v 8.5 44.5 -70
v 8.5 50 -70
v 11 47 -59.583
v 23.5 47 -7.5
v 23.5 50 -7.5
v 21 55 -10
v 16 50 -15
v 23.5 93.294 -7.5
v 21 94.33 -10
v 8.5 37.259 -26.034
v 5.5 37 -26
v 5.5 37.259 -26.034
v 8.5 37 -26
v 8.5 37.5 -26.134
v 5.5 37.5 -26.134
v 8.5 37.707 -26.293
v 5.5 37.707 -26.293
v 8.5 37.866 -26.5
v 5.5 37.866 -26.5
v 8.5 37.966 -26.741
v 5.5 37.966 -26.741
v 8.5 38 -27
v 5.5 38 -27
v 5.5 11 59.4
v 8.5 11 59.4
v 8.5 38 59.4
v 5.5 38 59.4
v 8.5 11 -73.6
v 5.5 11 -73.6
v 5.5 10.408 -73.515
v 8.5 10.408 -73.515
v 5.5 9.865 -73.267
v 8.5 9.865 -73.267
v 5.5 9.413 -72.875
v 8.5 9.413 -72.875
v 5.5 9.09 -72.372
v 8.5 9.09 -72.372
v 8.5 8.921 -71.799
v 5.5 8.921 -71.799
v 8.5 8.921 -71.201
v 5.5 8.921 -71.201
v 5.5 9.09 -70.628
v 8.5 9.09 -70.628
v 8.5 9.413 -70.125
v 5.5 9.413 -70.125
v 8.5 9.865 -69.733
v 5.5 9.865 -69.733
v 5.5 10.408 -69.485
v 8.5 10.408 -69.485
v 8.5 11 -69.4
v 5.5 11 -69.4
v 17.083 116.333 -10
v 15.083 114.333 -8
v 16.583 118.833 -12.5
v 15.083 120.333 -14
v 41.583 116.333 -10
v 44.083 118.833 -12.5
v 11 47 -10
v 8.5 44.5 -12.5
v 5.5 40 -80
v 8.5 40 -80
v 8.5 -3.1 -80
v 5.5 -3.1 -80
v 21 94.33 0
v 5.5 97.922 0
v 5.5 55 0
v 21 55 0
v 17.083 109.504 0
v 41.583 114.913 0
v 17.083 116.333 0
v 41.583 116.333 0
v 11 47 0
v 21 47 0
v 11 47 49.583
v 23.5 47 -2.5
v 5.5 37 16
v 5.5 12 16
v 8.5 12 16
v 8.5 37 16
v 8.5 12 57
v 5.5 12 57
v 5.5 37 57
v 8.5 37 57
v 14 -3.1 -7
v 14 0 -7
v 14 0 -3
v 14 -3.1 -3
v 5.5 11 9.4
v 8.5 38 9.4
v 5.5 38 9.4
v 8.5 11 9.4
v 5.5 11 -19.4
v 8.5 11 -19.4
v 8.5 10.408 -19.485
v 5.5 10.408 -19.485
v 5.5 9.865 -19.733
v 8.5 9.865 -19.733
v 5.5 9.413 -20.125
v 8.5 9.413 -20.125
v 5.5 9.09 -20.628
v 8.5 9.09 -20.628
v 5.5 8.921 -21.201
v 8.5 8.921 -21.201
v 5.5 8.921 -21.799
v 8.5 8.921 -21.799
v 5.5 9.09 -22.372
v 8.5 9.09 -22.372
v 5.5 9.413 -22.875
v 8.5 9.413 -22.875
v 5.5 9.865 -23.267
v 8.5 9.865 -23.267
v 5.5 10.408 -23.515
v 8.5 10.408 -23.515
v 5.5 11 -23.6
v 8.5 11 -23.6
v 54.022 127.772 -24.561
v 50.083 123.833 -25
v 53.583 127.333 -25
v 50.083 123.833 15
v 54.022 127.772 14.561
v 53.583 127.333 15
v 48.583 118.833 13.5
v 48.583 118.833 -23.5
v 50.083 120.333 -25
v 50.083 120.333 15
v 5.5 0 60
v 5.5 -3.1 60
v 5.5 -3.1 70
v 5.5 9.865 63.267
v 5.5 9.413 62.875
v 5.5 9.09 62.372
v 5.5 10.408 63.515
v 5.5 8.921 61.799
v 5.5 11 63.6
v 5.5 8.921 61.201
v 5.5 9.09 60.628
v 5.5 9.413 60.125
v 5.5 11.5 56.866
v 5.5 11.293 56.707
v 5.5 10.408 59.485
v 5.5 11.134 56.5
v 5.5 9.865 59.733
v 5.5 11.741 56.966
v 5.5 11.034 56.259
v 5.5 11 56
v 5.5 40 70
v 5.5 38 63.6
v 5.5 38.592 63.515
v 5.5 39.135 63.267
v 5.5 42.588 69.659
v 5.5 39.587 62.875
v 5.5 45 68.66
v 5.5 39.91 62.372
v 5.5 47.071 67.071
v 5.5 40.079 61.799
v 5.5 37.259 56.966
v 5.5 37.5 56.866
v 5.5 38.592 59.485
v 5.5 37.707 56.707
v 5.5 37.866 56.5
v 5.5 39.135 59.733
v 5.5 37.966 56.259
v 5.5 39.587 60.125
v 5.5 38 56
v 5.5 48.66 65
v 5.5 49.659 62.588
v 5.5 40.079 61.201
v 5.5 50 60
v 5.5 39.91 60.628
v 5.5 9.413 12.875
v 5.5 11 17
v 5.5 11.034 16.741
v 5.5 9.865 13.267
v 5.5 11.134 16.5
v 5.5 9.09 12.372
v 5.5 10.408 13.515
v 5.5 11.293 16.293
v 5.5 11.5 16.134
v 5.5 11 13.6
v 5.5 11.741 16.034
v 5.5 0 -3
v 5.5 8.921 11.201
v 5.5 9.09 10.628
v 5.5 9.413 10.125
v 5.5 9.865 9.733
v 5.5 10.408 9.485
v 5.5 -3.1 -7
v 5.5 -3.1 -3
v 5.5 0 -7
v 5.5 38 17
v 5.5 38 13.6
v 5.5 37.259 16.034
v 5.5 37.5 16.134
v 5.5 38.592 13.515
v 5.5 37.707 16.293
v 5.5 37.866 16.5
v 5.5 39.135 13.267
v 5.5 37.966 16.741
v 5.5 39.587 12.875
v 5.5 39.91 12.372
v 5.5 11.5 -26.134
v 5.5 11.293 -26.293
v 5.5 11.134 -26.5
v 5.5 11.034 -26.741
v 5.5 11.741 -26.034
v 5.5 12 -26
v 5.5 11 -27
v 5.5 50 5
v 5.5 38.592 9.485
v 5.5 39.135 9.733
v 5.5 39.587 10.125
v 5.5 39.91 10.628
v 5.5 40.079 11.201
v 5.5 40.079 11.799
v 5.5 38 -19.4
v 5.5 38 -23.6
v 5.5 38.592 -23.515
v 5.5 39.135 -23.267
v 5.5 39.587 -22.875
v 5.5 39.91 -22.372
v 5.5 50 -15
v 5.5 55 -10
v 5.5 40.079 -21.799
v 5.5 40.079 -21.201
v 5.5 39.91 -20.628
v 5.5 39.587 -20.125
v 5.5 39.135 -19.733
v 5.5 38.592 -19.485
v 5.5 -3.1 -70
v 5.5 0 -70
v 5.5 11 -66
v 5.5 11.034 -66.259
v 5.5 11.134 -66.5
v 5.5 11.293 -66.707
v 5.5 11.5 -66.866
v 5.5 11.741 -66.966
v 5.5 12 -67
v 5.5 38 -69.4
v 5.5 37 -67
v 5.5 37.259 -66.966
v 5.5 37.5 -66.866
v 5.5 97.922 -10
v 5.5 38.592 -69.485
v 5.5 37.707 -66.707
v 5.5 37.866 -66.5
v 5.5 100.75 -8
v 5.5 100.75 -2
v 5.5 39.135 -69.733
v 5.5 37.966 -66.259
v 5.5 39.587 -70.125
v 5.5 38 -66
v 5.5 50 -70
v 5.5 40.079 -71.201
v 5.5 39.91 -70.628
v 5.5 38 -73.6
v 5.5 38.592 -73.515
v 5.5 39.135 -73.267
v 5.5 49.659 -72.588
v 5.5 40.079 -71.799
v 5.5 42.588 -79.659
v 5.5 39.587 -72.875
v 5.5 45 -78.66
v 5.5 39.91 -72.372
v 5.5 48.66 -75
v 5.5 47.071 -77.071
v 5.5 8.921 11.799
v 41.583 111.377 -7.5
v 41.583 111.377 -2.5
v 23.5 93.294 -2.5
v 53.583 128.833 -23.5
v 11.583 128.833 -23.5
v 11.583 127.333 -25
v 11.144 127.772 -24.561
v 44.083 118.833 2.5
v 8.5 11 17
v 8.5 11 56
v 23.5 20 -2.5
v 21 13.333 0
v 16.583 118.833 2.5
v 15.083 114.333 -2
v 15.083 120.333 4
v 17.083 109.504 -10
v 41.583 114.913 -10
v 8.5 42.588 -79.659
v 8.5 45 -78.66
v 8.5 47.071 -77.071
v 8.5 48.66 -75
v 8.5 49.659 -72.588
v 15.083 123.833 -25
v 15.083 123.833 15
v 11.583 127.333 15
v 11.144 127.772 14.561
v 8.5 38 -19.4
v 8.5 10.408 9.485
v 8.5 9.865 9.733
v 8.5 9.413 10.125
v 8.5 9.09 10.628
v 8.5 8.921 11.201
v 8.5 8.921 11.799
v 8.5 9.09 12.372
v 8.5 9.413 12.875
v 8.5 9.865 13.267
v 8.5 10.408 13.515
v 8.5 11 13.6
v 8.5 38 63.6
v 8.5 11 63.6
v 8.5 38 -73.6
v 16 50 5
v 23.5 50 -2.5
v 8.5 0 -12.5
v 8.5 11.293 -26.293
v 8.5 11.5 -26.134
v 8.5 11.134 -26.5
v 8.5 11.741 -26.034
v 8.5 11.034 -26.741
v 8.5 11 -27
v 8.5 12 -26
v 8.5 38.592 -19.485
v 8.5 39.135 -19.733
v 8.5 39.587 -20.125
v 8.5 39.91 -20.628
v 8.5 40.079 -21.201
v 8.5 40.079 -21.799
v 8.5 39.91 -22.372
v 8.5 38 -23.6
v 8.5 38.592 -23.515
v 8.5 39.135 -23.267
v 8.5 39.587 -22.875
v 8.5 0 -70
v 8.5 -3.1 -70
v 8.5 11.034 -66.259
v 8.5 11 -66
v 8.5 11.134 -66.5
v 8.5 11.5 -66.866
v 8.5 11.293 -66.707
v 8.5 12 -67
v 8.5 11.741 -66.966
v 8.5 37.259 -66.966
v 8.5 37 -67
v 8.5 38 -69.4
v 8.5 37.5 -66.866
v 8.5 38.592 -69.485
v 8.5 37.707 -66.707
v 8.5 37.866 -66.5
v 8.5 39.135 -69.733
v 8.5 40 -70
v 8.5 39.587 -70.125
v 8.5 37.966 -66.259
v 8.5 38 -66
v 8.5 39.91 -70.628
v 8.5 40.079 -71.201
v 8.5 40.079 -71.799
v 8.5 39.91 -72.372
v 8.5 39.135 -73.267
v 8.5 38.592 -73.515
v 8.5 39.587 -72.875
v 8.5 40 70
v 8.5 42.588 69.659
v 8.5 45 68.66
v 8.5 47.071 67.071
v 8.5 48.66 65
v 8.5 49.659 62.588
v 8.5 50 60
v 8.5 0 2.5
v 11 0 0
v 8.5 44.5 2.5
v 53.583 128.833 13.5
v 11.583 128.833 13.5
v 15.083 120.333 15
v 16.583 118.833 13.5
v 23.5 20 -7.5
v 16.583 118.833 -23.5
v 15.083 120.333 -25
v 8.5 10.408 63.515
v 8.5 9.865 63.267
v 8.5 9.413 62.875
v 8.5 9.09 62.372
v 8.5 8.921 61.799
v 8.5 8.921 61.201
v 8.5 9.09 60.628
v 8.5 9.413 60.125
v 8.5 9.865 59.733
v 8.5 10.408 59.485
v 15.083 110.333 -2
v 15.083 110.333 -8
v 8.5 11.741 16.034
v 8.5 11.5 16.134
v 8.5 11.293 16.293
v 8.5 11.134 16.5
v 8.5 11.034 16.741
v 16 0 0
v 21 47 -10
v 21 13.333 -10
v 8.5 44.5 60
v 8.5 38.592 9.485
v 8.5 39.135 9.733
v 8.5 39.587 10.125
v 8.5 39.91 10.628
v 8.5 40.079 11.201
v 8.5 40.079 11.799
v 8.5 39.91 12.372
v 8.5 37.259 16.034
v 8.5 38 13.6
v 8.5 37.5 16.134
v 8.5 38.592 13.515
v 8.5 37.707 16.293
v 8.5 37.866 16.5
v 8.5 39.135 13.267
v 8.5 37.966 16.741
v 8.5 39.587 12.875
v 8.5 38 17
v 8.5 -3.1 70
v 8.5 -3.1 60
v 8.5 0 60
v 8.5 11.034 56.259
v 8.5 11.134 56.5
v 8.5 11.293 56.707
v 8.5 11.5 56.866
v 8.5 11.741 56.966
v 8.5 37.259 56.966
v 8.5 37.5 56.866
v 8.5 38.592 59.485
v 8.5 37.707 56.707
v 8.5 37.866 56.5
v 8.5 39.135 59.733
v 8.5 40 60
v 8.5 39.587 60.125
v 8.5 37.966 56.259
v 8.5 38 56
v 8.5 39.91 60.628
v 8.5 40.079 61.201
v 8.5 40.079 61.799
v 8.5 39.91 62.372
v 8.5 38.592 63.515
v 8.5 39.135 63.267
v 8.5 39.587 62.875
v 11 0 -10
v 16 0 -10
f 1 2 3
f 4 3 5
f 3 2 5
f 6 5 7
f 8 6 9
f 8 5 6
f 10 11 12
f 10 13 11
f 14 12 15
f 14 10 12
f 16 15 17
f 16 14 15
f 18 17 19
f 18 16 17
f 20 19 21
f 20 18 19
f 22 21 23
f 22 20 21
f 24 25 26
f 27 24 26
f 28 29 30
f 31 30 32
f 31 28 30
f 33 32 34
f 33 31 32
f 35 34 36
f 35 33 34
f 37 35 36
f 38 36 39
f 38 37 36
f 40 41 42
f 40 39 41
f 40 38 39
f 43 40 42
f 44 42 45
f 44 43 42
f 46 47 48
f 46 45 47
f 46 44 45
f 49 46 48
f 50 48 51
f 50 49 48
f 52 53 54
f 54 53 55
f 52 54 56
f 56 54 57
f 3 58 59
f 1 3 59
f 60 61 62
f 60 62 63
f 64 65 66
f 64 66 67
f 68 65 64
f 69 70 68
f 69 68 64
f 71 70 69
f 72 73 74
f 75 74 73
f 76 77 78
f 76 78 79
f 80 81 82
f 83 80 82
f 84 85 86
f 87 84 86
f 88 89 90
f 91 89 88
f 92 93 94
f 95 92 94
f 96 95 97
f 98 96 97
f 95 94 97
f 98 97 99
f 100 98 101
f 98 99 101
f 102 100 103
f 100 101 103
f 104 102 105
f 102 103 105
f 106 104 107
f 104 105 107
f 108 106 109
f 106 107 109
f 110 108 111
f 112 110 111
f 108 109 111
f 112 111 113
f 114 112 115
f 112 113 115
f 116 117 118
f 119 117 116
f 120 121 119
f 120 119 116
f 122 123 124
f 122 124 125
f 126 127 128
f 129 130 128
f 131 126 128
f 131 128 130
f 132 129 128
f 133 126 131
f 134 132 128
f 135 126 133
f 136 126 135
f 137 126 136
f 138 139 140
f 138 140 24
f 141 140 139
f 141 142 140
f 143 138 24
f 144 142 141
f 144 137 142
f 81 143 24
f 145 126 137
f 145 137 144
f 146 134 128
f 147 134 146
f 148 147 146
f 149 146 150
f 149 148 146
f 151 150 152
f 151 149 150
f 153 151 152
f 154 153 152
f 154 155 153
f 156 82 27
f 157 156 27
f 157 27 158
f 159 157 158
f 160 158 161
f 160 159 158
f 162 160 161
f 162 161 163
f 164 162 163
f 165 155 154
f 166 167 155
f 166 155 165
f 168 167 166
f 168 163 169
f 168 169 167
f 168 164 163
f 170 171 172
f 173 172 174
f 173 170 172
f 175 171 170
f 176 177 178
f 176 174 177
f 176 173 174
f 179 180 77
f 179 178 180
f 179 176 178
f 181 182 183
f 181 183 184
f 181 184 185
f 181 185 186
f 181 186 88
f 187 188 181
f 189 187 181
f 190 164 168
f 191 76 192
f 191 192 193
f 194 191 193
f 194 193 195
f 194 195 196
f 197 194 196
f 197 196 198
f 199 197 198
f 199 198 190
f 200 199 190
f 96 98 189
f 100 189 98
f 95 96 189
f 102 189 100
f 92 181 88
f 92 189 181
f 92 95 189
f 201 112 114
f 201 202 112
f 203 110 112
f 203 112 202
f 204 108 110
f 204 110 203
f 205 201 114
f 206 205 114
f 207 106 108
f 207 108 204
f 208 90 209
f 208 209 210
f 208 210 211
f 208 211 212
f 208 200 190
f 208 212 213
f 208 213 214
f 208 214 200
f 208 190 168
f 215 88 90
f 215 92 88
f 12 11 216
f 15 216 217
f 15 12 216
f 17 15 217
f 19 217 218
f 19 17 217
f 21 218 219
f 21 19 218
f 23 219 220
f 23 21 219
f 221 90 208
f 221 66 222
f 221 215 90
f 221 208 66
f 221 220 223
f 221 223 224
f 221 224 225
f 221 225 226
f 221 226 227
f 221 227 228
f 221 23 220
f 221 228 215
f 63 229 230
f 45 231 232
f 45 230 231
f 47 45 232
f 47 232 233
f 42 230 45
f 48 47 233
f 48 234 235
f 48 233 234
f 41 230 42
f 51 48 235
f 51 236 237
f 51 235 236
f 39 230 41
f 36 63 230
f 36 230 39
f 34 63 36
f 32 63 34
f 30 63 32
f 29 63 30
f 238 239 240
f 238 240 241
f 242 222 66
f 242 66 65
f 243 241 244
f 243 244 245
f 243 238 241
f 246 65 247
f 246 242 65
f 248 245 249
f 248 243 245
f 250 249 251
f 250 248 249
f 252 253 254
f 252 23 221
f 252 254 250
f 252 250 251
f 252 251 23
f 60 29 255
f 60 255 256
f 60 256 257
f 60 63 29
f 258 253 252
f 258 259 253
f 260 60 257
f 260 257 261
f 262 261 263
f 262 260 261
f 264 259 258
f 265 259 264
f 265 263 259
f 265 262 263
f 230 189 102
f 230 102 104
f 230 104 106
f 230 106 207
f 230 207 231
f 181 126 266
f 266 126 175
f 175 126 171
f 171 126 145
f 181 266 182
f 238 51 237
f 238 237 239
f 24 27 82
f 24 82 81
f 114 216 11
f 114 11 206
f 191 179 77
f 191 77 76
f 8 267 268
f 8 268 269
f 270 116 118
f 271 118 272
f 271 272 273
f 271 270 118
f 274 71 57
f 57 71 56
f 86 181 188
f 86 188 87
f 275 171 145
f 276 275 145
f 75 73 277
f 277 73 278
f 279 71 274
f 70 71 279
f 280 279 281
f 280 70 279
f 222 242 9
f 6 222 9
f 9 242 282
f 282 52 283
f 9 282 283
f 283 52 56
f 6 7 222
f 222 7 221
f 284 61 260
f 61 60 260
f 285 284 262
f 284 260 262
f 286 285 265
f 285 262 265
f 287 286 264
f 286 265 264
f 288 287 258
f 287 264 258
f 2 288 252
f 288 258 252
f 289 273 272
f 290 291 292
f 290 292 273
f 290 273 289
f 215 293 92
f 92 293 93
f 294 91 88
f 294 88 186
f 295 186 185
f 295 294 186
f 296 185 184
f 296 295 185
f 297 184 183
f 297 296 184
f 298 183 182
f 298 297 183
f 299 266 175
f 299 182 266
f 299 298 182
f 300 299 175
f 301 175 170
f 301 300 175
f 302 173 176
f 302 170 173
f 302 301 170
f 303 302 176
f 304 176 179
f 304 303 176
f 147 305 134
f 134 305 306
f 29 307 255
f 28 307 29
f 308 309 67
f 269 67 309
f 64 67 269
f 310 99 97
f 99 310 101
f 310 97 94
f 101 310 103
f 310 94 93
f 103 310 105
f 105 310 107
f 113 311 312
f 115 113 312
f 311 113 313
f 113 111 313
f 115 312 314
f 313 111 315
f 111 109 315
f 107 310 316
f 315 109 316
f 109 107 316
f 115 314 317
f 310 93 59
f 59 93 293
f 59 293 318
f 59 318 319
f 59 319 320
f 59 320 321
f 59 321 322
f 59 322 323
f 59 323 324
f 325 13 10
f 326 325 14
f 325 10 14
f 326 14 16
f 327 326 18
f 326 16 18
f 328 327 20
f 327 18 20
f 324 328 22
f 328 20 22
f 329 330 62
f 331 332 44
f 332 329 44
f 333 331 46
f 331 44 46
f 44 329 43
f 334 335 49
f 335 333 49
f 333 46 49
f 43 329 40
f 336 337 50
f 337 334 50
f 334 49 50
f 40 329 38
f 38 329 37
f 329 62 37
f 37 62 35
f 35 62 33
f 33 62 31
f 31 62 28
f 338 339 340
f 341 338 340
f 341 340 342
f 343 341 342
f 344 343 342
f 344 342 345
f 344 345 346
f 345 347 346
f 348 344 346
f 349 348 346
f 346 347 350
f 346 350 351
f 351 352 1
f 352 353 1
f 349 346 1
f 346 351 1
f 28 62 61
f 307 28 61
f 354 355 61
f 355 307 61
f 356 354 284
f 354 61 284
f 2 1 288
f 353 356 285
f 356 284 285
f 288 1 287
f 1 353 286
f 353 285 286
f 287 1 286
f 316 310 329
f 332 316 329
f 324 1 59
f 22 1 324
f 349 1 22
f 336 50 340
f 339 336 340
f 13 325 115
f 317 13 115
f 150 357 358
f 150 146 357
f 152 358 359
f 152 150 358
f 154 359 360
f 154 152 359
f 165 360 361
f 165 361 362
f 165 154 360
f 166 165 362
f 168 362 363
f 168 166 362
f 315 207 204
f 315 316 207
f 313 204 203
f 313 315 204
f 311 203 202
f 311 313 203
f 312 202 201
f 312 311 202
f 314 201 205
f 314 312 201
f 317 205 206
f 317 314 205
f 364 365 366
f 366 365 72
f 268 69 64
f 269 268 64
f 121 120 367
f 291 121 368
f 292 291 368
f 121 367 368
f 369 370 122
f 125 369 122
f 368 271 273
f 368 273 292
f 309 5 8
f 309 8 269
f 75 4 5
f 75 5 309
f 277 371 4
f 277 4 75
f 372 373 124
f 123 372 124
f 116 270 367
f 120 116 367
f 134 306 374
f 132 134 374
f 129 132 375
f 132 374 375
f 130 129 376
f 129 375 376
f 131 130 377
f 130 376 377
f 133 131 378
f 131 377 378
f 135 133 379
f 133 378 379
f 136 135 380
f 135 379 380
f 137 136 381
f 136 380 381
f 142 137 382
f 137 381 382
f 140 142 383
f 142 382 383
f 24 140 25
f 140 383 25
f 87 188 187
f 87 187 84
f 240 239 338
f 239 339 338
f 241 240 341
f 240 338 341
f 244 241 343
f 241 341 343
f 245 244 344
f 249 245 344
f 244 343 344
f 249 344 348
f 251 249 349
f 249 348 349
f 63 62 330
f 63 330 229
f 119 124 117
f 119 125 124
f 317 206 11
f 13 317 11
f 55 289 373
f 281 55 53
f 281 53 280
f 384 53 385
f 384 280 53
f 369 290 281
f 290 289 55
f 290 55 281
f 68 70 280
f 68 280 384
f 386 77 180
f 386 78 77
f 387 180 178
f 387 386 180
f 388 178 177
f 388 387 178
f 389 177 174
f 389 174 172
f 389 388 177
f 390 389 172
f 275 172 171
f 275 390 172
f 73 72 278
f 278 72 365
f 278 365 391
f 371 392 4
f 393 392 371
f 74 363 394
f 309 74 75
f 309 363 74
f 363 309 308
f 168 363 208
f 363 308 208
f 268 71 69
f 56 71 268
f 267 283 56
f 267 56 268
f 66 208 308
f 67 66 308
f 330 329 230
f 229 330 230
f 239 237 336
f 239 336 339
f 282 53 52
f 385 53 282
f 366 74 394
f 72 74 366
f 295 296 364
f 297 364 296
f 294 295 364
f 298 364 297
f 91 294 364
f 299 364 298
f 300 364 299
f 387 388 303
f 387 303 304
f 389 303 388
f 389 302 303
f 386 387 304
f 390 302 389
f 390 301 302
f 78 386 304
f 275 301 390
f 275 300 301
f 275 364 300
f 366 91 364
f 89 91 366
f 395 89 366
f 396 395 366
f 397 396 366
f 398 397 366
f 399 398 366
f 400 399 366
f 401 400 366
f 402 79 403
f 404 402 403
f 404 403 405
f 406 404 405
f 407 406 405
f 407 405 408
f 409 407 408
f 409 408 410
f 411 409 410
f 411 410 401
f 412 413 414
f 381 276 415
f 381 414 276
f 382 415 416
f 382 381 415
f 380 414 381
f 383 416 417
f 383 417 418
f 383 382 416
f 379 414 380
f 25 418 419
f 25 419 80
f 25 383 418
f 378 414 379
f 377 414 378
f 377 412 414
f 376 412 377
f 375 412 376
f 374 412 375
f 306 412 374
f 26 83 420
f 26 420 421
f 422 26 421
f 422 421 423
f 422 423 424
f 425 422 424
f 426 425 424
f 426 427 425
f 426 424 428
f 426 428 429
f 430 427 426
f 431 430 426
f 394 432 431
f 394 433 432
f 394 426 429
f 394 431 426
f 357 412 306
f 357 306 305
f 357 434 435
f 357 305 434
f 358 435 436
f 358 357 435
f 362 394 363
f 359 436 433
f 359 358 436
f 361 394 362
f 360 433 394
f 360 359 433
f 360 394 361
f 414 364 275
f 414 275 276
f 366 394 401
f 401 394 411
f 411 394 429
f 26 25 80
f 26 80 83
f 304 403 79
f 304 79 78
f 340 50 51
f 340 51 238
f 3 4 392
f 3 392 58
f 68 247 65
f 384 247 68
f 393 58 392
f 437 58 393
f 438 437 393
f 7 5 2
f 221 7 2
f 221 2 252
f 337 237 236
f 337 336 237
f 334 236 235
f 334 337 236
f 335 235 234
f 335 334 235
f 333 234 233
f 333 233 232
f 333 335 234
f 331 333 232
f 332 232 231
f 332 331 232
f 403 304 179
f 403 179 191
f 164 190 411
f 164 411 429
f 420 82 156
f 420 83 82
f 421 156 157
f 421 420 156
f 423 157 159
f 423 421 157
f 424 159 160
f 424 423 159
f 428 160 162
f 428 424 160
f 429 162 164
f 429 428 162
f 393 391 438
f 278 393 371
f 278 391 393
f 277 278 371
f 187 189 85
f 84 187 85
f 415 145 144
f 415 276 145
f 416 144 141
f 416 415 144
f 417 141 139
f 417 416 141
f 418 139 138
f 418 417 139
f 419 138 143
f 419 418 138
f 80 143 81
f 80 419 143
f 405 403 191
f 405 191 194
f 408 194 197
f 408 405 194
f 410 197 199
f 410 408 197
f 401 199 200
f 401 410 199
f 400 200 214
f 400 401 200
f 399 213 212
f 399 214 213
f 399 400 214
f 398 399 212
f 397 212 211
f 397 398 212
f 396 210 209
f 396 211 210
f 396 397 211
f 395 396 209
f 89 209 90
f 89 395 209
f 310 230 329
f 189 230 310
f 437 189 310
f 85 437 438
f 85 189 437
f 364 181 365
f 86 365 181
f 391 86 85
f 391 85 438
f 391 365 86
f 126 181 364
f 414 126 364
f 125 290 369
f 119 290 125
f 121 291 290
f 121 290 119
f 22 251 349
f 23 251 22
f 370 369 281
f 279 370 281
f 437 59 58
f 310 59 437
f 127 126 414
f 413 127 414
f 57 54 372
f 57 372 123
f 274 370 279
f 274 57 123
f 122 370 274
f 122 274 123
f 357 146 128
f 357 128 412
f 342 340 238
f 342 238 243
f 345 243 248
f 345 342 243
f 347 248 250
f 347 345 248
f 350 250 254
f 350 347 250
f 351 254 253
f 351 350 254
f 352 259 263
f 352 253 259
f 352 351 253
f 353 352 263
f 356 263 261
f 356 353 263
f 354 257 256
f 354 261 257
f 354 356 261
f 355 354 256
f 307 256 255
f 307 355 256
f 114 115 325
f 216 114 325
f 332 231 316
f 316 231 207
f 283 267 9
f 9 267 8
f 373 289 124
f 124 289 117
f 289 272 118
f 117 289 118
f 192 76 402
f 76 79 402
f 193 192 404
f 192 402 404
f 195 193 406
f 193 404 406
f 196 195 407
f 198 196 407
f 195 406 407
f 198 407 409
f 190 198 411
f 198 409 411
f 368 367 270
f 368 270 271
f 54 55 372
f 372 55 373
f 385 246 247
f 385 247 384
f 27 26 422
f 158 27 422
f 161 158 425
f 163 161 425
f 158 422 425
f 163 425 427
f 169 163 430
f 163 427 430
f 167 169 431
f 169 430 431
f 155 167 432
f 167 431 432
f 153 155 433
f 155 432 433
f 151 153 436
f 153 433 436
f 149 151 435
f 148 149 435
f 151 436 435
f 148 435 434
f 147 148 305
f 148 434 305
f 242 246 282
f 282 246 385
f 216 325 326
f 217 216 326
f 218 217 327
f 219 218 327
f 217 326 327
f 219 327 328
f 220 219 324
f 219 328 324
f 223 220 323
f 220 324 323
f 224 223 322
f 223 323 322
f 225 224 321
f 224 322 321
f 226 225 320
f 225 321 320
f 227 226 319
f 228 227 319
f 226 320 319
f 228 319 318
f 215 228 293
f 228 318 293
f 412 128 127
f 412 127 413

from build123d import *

# Parameters (mm, degrees)
SKETCH_2_W              = 17.5
SKETCH_2_H              = 10
EXTRUDE_1_DEPTH         = 125
SKETCH_3_W              = 50
SKETCH_3_H              = 30
EXTRUDE_2_DEPTH         = 7.5
CHAMFER_1_SIZE          = 1
EXTRUDE_3_DEPTH         = 17.5
CHAMFER_2_SIZE          = 2
CHAMFER_3_SIZE          = 2
SKETCH_6_W              = 10
SKETCH_6_H              = 3
EXTRUDE_4_DEPTH         = 3.1
SKETCH_7_W              = 70
SKETCH_7_H              = 50
EXTRUDE_5_DEPTH         = 3.25
SKETCH_15_W             = 70
SKETCH_15_H             = 50
CUT_EXTRUDE_7_DEPTH     = 0.25
SKETCH_16_W             = 41
SKETCH_16_H             = 27
CUT_EXTRUDE_8_DEPTH     = 39.25
CHAMFER_7_SIZE          = 2
FILLET_1_R              = 1
FILLET_2_R              = 10
EXTRUDE_7_DEPTH         = 3
SKETCH_19_W             = 101.779204681
SKETCH_19_H             = 48.287293129
CUT_EXTRUDE_10_DEPTH    = 7.5
SKETCH_21_W             = 30
SKETCH_21_H             = 50
EXTRUDE_8_DEPTH         = 10
EXTRUDE_9_DEPTH         = 50
SKETCH_24_W             = 6
SKETCH_24_H             = 6
EXTRUDE_10_DEPTH        = 2
CUT_EXTRUDE_11_DEPTH    = 44
CHAMFER_9_SIZE          = 3
SKETCH_27_R             = 3.5
CUT_EXTRUDE_13_DEPTH    = 31
SKETCH_28_W             = 121.830720906
SKETCH_28_H             = 94.628612201
CUT_EXTRUDE_14_DEPTH    = 75
SKETCH_29_W             = 31.647498983
SKETCH_29_H             = 23.6528393
CUT_EXTRUDE_15_DEPTH    = 75
SKETCH_30_W             = 23.6528393
SKETCH_30_H             = 50
EXTRUDE_11_DEPTH        = 3
SKETCH_31_W             = 12.609658301
SKETCH_31_H             = 23.6528393
EXTRUDE_12_DEPTH        = 3
SKETCH_33_W             = 17.8
SKETCH_33_H             = 10
EXTRUDE_13_DEPTH        = 50
SKETCH_34_W             = 10
SKETCH_34_H             = 35
CUT_EXTRUDE_16_DEPTH    = 5.75
EXTRUDE_15_DEPTH        = 10
CUT_EXTRUDE_17_DEPTH    = 37
SKETCH_38_W             = 26
SKETCH_38_H             = 99.175
EXTRUDE_16_DEPTH        = 4
CHAMFER_11_SIZE         = 1
CHAMFER_11_EDGE_2_SIZE  = 1
CHAMFER_11_EDGE_3_SIZE2 = 0.707106781
CHAMFER_11_EDGE_3_SIZE  = 1
CHAMFER_11_EDGE_4_SIZE2 = 1
CHAMFER_11_EDGE_4_SIZE  = 0.707106781
SKETCH_40_W             = 14.8
SKETCH_40_H             = 10
CUT_EXTRUDE_18_DEPTH    = 180
SKETCH_41_W             = 58.425807109
SKETCH_41_H             = 132.043018415
CUT_EXTRUDE_19_DEPTH    = 180
SKETCH_43_W             = 42.288790166
SKETCH_43_H             = 33.906174504
CUT_EXTRUDE_20_DEPTH    = 180
SKETCH_44_W             = 60.210135913
SKETCH_44_H             = 20.917157606
CUT_EXTRUDE_21_DEPTH    = 180
SKETCH_45_W             = 2
SKETCH_45_H             = 38
CUT_EXTRUDE_22_DEPTH    = 180
SKETCH_46_W             = 19.341721819
SKETCH_46_H             = 130
CUT_EXTRUDE_23_DEPTH    = 3
EXTRUDE_17_DEPTH        = 3
SKETCH_48_W             = 15
SKETCH_48_H             = 10
CUT_EXTRUDE_24_DEPTH    = 7
SKETCH_50_W             = 23.75
SKETCH_50_H             = 10
EXTRUDE_18_DEPTH        = 90
EXTRUDE_19_DEPTH        = 10
SKETCH_53_W             = 5.75
SKETCH_53_H             = 10
EXTRUDE_20_DEPTH        = 106
SKETCH_55_W             = 5.75
SKETCH_55_H             = 10
CUT_EXTRUDE_25_DEPTH    = 106
EXTRUDE_21_DEPTH        = 20
CUT_EXTRUDE_26_DEPTH    = 20
EXTRUDE_22_DEPTH        = 10
CHAMFER_14_SIZE         = 2.5
CHAMFER_15_SIZE         = 2.5
CHAMFER_16_SIZE         = 1.5
CHAMFER_17_SIZE         = 1.5
CUT_EXTRUDE_27_DEPTH    = 10
CHAMFER_18_SIZE         = 5
SKETCH_62_W             = 2.25
SKETCH_62_H             = 3
EXTRUDE_24_DEPTH        = 3.1
SKETCH_63_W             = 1.75
SKETCH_63_H             = 3
CUT_EXTRUDE_28_DEPTH    = 3.1
SKETCH_64_W             = 10.5
SKETCH_64_H             = 3
CUT_EXTRUDE_29_DEPTH    = 3.1
CHAMFER_19_SIZE         = 2
SKETCH_65_W             = 3
SKETCH_65_H             = 3.1
EXTRUDE_25_DEPTH        = 10
SKETCH_66_W             = 3
SKETCH_66_H             = 3.1
EXTRUDE_26_DEPTH        = 10
SKETCH_67_W             = 8.5
SKETCH_67_H             = 4
EXTRUDE_27_DEPTH        = 3.1


with BuildPart() as part:
    # Sketch 2 → Extrude 1 (new body)
    with BuildSketch(Plane(origin=(0, 0, 0), x_dir=(1, 0, 0), z_dir=(0, 1, 0))):
        with Locations((8.75, 5)):
            Rectangle(SKETCH_2_W, SKETCH_2_H)
    extrude(amount=EXTRUDE_1_DEPTH)

    # Sketch 3 → Extrude 2 (add)
    with BuildSketch(Plane(origin=(0, 125, 0), x_dir=(1, 0, 0), z_dir=(0, 1, 0))):
        with Locations((8.75, 5)):
            Rectangle(SKETCH_3_W, SKETCH_3_H)
    extrude(amount=EXTRUDE_2_DEPTH)

    # Chamfer 1
    chamfer_1_edges = [part.edges().sort_by_distance(p)[0] for p in [
        (33.75, 132.5, -5),
        (8.75, 132.5, -20),
        (-16.25, 132.5, -5),
        (8.75, 132.5, 10),
    ]]
    chamfer(chamfer_1_edges, length=CHAMFER_1_SIZE)

    # Sketch 5 → Extrude 3 (add)
    with BuildSketch(Plane(origin=(17.5, 0, 0), x_dir=(0, 0, -1), z_dir=(1, 0, 0))):
        Polygon((10, 125), (20, 125), (10, 110), align=None)
        Polygon((0, 125), (-10, 125), (0, 110), align=None)
    extrude(amount=-EXTRUDE_3_DEPTH)

    # Chamfer 2
    chamfer_2_edges = [part.edges().sort_by_distance(p)[0] for p in [
        (-8.125, 125, -20),
        (33.75, 125, -5),
        (-16.25, 125, -5),
        (-8.125, 125, 10),
        (25.625, 125, -20),
        (25.625, 125, 10),
    ]]
    chamfer(chamfer_2_edges, length=CHAMFER_2_SIZE)

    # Chamfer 3
    chamfer_3_edges = [part.edges().sort_by_distance(p)[0] for p in [
        (0, 55, -10),
        (17.5, 55, -10),
        (17.5, 55, 0),
        (0, 55, 0),
    ]]
    chamfer(chamfer_3_edges, length=CHAMFER_3_SIZE)

    # Sketch 6 → Extrude 4 (add)
    with BuildSketch(Plane.XZ):
        with Locations((8.75, -5)):
            Rectangle(SKETCH_6_W, SKETCH_6_H)
    extrude(amount=EXTRUDE_4_DEPTH)

    # Sketch 7 → Extrude 5 (add)
    with BuildSketch(Plane.ZY.offset(-8.75)):
        with Locations((-45, 25)):
            Rectangle(SKETCH_7_W, SKETCH_7_H)
    extrude_5 = extrude(amount=EXTRUDE_5_DEPTH)

    # Mirror 1: Extrude 5 across plane
    add(extrude_5.mirror(Plane(origin=(0, 0, -5), x_dir=(1, 0, 0), z_dir=(0, 0, -1))))

    # Sketch 15 → Cut-Extrude 7 (cut)
    with BuildSketch(Plane(origin=(8.75, 0, 0), x_dir=(0, 0, -1), z_dir=(1, 0, 0))):
        with Locations((-35, 25)):
            Rectangle(SKETCH_15_W, SKETCH_15_H)
        with Locations((45, 25)):
            Rectangle(SKETCH_15_W, SKETCH_15_H)
    extrude(amount=-CUT_EXTRUDE_7_DEPTH, mode=Mode.SUBTRACT)

    # Sketch 16 → Cut-Extrude 8 (cut)
    with BuildSketch(Plane.ZY.offset(-5.5)):
        with Locations((-46.5, 24.5)):
            Rectangle(SKETCH_16_W, SKETCH_16_H)
        with Locations((36.5, 24.5)):
            Rectangle(SKETCH_16_W, SKETCH_16_H)
    extrude(amount=-CUT_EXTRUDE_8_DEPTH, mode=Mode.SUBTRACT)

    # Chamfer 7
    chamfer_7_edges = [part.edges().sort_by_distance(p)[0] for p in [
        (5.5, 25, -10),
        (5.5, 25, 0),
        (8.5, 25, 0),
        (8.5, 25, -10),
    ]]
    chamfer(chamfer_7_edges, length=CHAMFER_7_SIZE)

    # Fillet 1
    fillet_1_edges = [part.edges().sort_by_distance(p)[0] for p in [
        (7, 38, -26),
        (7, 11, -26),
        (7, 11, -67),
        (7, 38, -67),
        (7, 11, 16),
        (7, 38, 16),
        (7, 38, 57),
        (7, 11, 57),
    ]]
    fillet(fillet_1_edges, radius=FILLET_1_R)

    # Fillet 2
    fillet_2_edges = [part.edges().sort_by_distance(p)[0] for p in [
        (7, 50, -80),
        (7, 50, 70),
    ]]
    fillet(fillet_2_edges, radius=FILLET_2_R)

    # Sketch 17 → Extrude 7 (add)
    with BuildSketch(Plane(origin=(0, 50, 0), x_dir=(1, 0, 0), z_dir=(0, 1, 0))):
        Polygon((5.5, 70), (-9.5, 20), (-9.5, -10), (5.5, -60), align=None)
    extrude(amount=-EXTRUDE_7_DEPTH)

    # Sketch 19 → Cut-Extrude 10 (cut)
    with BuildSketch(Plane(origin=(0, 132.5, 0), x_dir=(1, 0, 0), z_dir=(0, 1, 0))):
        with Locations((10.051154605, 7.674595578)):
            Rectangle(SKETCH_19_W, SKETCH_19_H)
    extrude(amount=-CUT_EXTRUDE_10_DEPTH, mode=Mode.SUBTRACT)

    # Sketch 21 → Extrude 8 (add)
    with BuildSketch(Plane(origin=(0, 125, 0), x_dir=(1, 0, 0), z_dir=(0, 1, 0))):
        with Locations((8.75, 5)):
            Rectangle(SKETCH_21_W, SKETCH_21_H)
    extrude(amount=EXTRUDE_8_DEPTH)

    # Sketch 23 → Extrude 9 (add)
    with BuildSketch(Plane.XY.offset(20)):
        Polygon((23.75, 130), (23.75, 135), (28.75, 135), align=None)
        Polygon((-11.25, 135), (-6.25, 135), (-6.25, 130), align=None)
    extrude(amount=-EXTRUDE_9_DEPTH)

    # Sketch 24 → Extrude 10 (add)
    with BuildSketch(Plane.ZY):
        with Locations((-5, 3)):
            Rectangle(SKETCH_24_W, SKETCH_24_H)
    extrude(amount=EXTRUDE_10_DEPTH)

    # Sketch 25 → Cut-Extrude 11 (cut)
    with BuildSketch(Plane(origin=(8.5, 0, 0), x_dir=(0, 0, -1), z_dir=(1, 0, 0))):
        with BuildLine():
            Line((-13.6, 11), (-13.6, 38))
            ThreePointArc((-13.6, 38), (-11.5, 40.1), (-9.4, 38))
            Line((-9.4, 38), (-9.4, 11))
            ThreePointArc((-9.4, 11), (-11.5, 8.9), (-13.6, 11))
        make_face()
        with BuildLine():
            Line((-59.4, 11), (-59.4, 38))
            ThreePointArc((-59.4, 38), (-61.5, 40.1), (-63.6, 38))
            Line((-63.6, 38), (-63.6, 11))
            ThreePointArc((-63.6, 11), (-61.5, 8.9), (-59.4, 11))
        make_face()
        with BuildLine():
            Line((23.6, 11), (23.6, 38))
            ThreePointArc((23.6, 38), (21.5, 40.1), (19.4, 38))
            Line((19.4, 38), (19.4, 11))
            ThreePointArc((19.4, 11), (21.5, 8.9), (23.6, 11))
        make_face()
        with BuildLine():
            Line((69.4, 11), (69.4, 38))
            ThreePointArc((69.4, 38), (71.5, 40.1), (73.6, 38))
            Line((73.6, 38), (73.6, 11))
            ThreePointArc((73.6, 11), (71.5, 8.9), (69.4, 11))
        make_face()
    extrude(amount=-CUT_EXTRUDE_11_DEPTH, mode=Mode.SUBTRACT)

    # Chamfer 9
    chamfer_9_edges = [part.edges().sort_by_distance(p)[0] for p in [
        (17.5, 125, -5),
        (0, 125, -5),
    ]]
    chamfer(chamfer_9_edges, length=CHAMFER_9_SIZE)

    # Sketch 27 → Cut-Extrude 13 (cut)
    with BuildSketch(Plane.ZY):
        with Locations((-5, 115.5)):
            Circle(SKETCH_27_R)
    extrude(amount=-CUT_EXTRUDE_13_DEPTH, mode=Mode.SUBTRACT)

    # Sketch 28 → Cut-Extrude 14 (cut)
    with BuildSketch(Plane(origin=(0, 50, 0), x_dir=(1, 0, 0), z_dir=(0, 1, 0))):
        with Locations((13.662817894, 0.297507804)):
            Rectangle(SKETCH_28_W, SKETCH_28_H)
    extrude(amount=CUT_EXTRUDE_14_DEPTH, mode=Mode.SUBTRACT)

    # Sketch 29 → Cut-Extrude 15 (cut)
    with BuildSketch(Plane.XZ):
        with Locations((8.714091191, -5.118405237)):
            Rectangle(SKETCH_29_W, SKETCH_29_H)
    extrude(amount=-CUT_EXTRUDE_15_DEPTH, mode=Mode.SUBTRACT)

    # Sketch 30 → Extrude 11 (add)
    with BuildSketch(Plane(origin=(8.5, 0, 0), x_dir=(0, 0, -1), z_dir=(1, 0, 0))):
        with Locations((5.118405237, 25)):
            Rectangle(SKETCH_30_W, SKETCH_30_H)
    extrude(amount=-EXTRUDE_11_DEPTH)

    # Sketch 31 → Extrude 12 (add)
    with BuildSketch(Plane(origin=(0, 50, 0), x_dir=(1, 0, 0), z_dir=(0, 1, 0))):
        with Locations((-0.804829151, 5.118405237)):
            Rectangle(SKETCH_31_W, SKETCH_31_H)
    extrude(amount=-EXTRUDE_12_DEPTH)

    # Sketch 33 → Extrude 13 (add)
    with BuildSketch(Plane(origin=(0, 0, 0), x_dir=(1, 0, 0), z_dir=(0, 1, 0))):
        with Locations((8.65, 5)):
            Rectangle(SKETCH_33_W, SKETCH_33_H)
    extrude(amount=EXTRUDE_13_DEPTH)

    # Sketch 34 → Cut-Extrude 16 (cut)
    with BuildSketch(Plane.ZY.offset(0.25)):
        with Locations((-5, 29.5)):
            Rectangle(SKETCH_34_W, SKETCH_34_H)
    extrude(amount=-CUT_EXTRUDE_16_DEPTH, mode=Mode.SUBTRACT)

    # Sketch 36 → Extrude 15 (add)
    with BuildSketch(Plane.XY):
        Polygon((17.55, 0), (32.55, 0), (32.55, 125), (17.55, 125), (-6.25, 125), (17.55, 101.2), align=None)
    extrude(amount=-EXTRUDE_15_DEPTH)

    # Sketch 37 → Cut-Extrude 17 (cut)
    with BuildSketch(Plane.XY.offset(8)):
        Polygon((20.525, 0), (32.55, 0), (32.55, 12.025), align=None)
        Polygon((23.75, 125), (32.55, 116.2), (32.55, 125), align=None)
    extrude(amount=-CUT_EXTRUDE_17_DEPTH, mode=Mode.SUBTRACT)

    # Sketch 38 → Extrude 16 (add)
    with BuildSketch(Plane(origin=(28.55, 0, 0), x_dir=(0, 0, -1), z_dir=(1, 0, 0))):
        with Locations((5, 66.6125)):
            Rectangle(SKETCH_38_W, SKETCH_38_H)
    extrude(amount=EXTRUDE_16_DEPTH)

    # Chamfer 11
    chamfer_11_edges = [part.edges().sort_by_distance(p)[0] for p in [
        (8.75, 135, -30),
    ]]
    chamfer(chamfer_11_edges, length=CHAMFER_11_SIZE)

    # Chamfer 11 edge 2
    chamfer_11_edge_2_edges = [part.edges().sort_by_distance(p)[0] for p in [
        (8.75, 135, 20),
    ]]
    chamfer(chamfer_11_edge_2_edges, length=CHAMFER_11_EDGE_2_SIZE)

    # Chamfer 11 edge 3
    chamfer_11_edge_3_edges = [part.edges().sort_by_distance(p)[0] for p in [
        (28.75, 135, -5),
    ]]
    chamfer(chamfer_11_edge_3_edges, length=CHAMFER_11_EDGE_3_SIZE, length2=CHAMFER_11_EDGE_3_SIZE2)

    # Chamfer 11 edge 4
    chamfer_11_edge_4_edges = [part.edges().sort_by_distance(p)[0] for p in [
        (-11.25, 135, -5),
    ]]
    chamfer(chamfer_11_edge_4_edges, length=CHAMFER_11_EDGE_4_SIZE, length2=CHAMFER_11_EDGE_4_SIZE2)

    # Sketch 40 → Cut-Extrude 18 (cut)
    with BuildSketch(Plane.XZ):
        with Locations((25.15, -5)):
            Rectangle(SKETCH_40_W, SKETCH_40_H)
    extrude(amount=-CUT_EXTRUDE_18_DEPTH, mode=Mode.SUBTRACT)

    # Sketch 41 → Cut-Extrude 19 (cut)
    with BuildSketch(Plane.XY):
        with Locations((39.712903555, 78.021509208)):
            Rectangle(SKETCH_41_W, SKETCH_41_H)
    extrude(amount=-CUT_EXTRUDE_19_DEPTH, mode=Mode.SUBTRACT)

    # Sketch 43 → Cut-Extrude 20 (cut)
    with BuildSketch(Plane.XY.offset(8)):
        Polygon((28.55, 105.154838034), (28.55, 17.025), (32.55, 17.025), (32.55, 116.2), (28.55, 116.2), align=None)
        with Locations((7.405604917, 122.107925286)):
            Rectangle(SKETCH_43_W, SKETCH_43_H)
    extrude(amount=-CUT_EXTRUDE_20_DEPTH, mode=Mode.SUBTRACT)

    # Sketch 44 → Cut-Extrude 21 (cut)
    with BuildSketch(Plane(origin=(0, 0, 8), x_dir=(-1, 0, 0), z_dir=(0, 0, -1))):
        with Locations((-6.110520367, 129.607046371)):
            Rectangle(SKETCH_44_W, SKETCH_44_H)
    extrude(amount=-CUT_EXTRUDE_21_DEPTH, mode=Mode.SUBTRACT)

    # Sketch 45 → Cut-Extrude 22 (cut)
    with BuildSketch(Plane(origin=(0, 0, -10), x_dir=(-1, 0, 0), z_dir=(0, 0, -1))):
        with Locations((-9.5, 31)):
            Rectangle(SKETCH_45_W, SKETCH_45_H)
    extrude(amount=-CUT_EXTRUDE_22_DEPTH, mode=Mode.SUBTRACT)

    # Sketch 46 → Cut-Extrude 23 (cut)
    with BuildSketch(Plane(origin=(0, 50, 0), x_dir=(1, 0, 0), z_dir=(0, 1, 0))):
        with Locations((-4.170860909, 5)):
            Rectangle(SKETCH_46_W, SKETCH_46_H)
    extrude(amount=-CUT_EXTRUDE_23_DEPTH, mode=Mode.SUBTRACT)

    # Sketch 47 → Extrude 17 (add)
    with BuildSketch(Plane(origin=(0, 50, 0), x_dir=(1, 0, 0), z_dir=(0, 1, 0))):
        Polygon((8.5, 70), (23.5, 10), (23.5, 0), (8.5, -60), align=None)
    extrude(amount=-EXTRUDE_17_DEPTH)

    # Sketch 48 → Cut-Extrude 24 (cut)
    with BuildSketch(Plane(origin=(0, 12, 0), x_dir=(1, 0, 0), z_dir=(0, 1, 0))):
        with Locations((16, 5)):
            Rectangle(SKETCH_48_W, SKETCH_48_H)
    extrude(amount=-CUT_EXTRUDE_24_DEPTH, mode=Mode.SUBTRACT)

    # Sketch 50 → Extrude 18 (add)
    with BuildSketch(Plane(origin=(0, 5, 0), x_dir=(1, 0, 0), z_dir=(0, 1, 0))):
        with Locations((11.625, 5)):
            Rectangle(SKETCH_50_W, SKETCH_50_H)
    extrude(amount=EXTRUDE_18_DEPTH)

    # Sketch 52 → Extrude 19 (add)
    with BuildSketch(Plane(origin=(0, 0, -10), x_dir=(-1, 0, 0), z_dir=(0, 0, -1))):
        Polygon((0.25, 95), (-23.58290229, 118.83290229), (-41.58290229, 118.83290229), (-41.58290229, 111.377058167), (-23.5, 93.294155877), (-23.5, 95), align=None)
    extrude(amount=-EXTRUDE_19_DEPTH)

    # Sketch 53 → Extrude 20 (add)
    with BuildSketch(Plane.XZ):
        with Locations((20.625, -5)):
            Rectangle(SKETCH_53_W, SKETCH_53_H)
    extrude(amount=-EXTRUDE_20_DEPTH)

    # Sketch 55 → Cut-Extrude 25 (cut)
    with BuildSketch(Plane.XZ):
        with Locations((2.625, -5)):
            Rectangle(SKETCH_55_W, SKETCH_55_H)
    extrude(amount=-CUT_EXTRUDE_25_DEPTH, mode=Mode.SUBTRACT)

    # Sketch 56 → Extrude 21 (add)
    with BuildSketch(Plane.XY.offset(-5)):
        Polygon((15.08290229, 118.83290229), (50.08290229, 118.83290229), (50.08290229, 123.83290229), (55.08290229, 128.83290229), (47.58290229, 128.83290229), (15.08290229, 128.83290229), (10.08290229, 128.83290229), (15.08290229, 123.83290229), align=None)
    extrude_21 = extrude(amount=EXTRUDE_21_DEPTH)

    # Mirror 2: Extrude 21 across plane
    add(extrude_21.mirror(Plane.XY.offset(-5)))

    # Sketch 59 → Cut-Extrude 26 (cut)
    with BuildSketch(Plane.XY):
        Polygon((16, 0), (23.5, 20), (23.5, 0), align=None)
    extrude(amount=-CUT_EXTRUDE_26_DEPTH, mode=Mode.SUBTRACT)

    # Sketch 60 → Extrude 22 (add)
    with BuildSketch(Plane.XY):
        Polygon((15.08290229, 118.83290229), (15.08290229, 110.33290229), (23.58290229, 118.83290229), align=None)
    extrude(amount=-EXTRUDE_22_DEPTH)

    # Chamfer 14
    chamfer_14_edges = [part.edges().sort_by_distance(p)[0] for p in [
        (8.5, 47, -40),
        (8.5, 23.5, -10),
        (8.5, 47, 30),
        (23.5, 33.5, 0),
        (23.5, 33.5, -10),
        (23.5, 71.647077939, -10),
        (23.5, 71.647077939, 0),
        (32.541451145, 102.335607022, 0),
        (32.541451145, 102.335607022, -10),
        (8.5, 23.5, 0),
    ]]
    chamfer(chamfer_14_edges, length=CHAMFER_14_SIZE)

    # Chamfer 15
    chamfer_15_edges = [part.edges().sort_by_distance(p)[0] for p in [
        (28.33290229, 118.83290229, 0),
        (41.58290229, 118.83290229, -5),
        (28.33290229, 118.83290229, -10),
    ]]
    chamfer(chamfer_15_edges, length=CHAMFER_15_SIZE)

    # Chamfer 16
    chamfer_16_edges = [part.edges().sort_by_distance(p)[0] for p in [
        (10.08290229, 128.83290229, -5),
        (32.58290229, 128.83290229, 15),
        (55.08290229, 128.83290229, -5),
        (32.58290229, 128.83290229, -25),
    ]]
    chamfer(chamfer_16_edges, length=CHAMFER_16_SIZE)

    # Chamfer 17
    chamfer_17_edges = [part.edges().sort_by_distance(p)[0] for p in [
        (15.08290229, 118.83290229, 8.75),
        (50.08290229, 118.83290229, -5),
        (32.58290229, 118.83290229, 15),
        (32.58290229, 118.83290229, -25),
        (15.08290229, 118.83290229, -18.75),
    ]]
    chamfer(chamfer_17_edges, length=CHAMFER_17_SIZE)

    # Sketch 61 → Cut-Extrude 27 (cut)
    with BuildSketch(Plane(origin=(0, 50, 0), x_dir=(1, 0, 0), z_dir=(0, 1, 0))):
        Polygon((8.5, -60), (23.5, 2.5), (23.5, 0), align=None)
        Polygon((23.5, 10), (8.5, 70), (23.5, 7.5), align=None)
    extrude(amount=-CUT_EXTRUDE_27_DEPTH, mode=Mode.SUBTRACT)

    # Chamfer 18
    chamfer_18_edges = [part.edges().sort_by_distance(p)[0] for p in [
        (13.25, 50, -10),
        (13.25, 50, 0),
    ]]
    chamfer(chamfer_18_edges, length=CHAMFER_18_SIZE)

    # Sketch 62 → Extrude 24 (add)
    with BuildSketch(Plane.XZ):
        with Locations((14.875, -5)):
            Rectangle(SKETCH_62_W, SKETCH_62_H)
    extrude(amount=EXTRUDE_24_DEPTH)

    # Sketch 63 → Cut-Extrude 28 (cut)
    with BuildSketch(Plane.XZ.offset(3.1)):
        with Locations((4.625, -5)):
            Rectangle(SKETCH_63_W, SKETCH_63_H)
    extrude(amount=-CUT_EXTRUDE_28_DEPTH, mode=Mode.SUBTRACT)

    # Sketch 64 → Cut-Extrude 29 (cut)
    with BuildSketch(Plane.XZ.offset(3.1)):
        with Locations((10.75, -5)):
            Rectangle(SKETCH_64_W, SKETCH_64_H)
    extrude(amount=-CUT_EXTRUDE_29_DEPTH, mode=Mode.SUBTRACT)

    # Chamfer 19
    chamfer_19_edges = [part.edges().sort_by_distance(p)[0] for p in [
        (10.291451145, 105.541451145, -10),
        (10.291451145, 105.541451145, 0),
        (15.08290229, 113.33290229, -10),
        (15.08290229, 113.33290229, 0),
    ]]
    chamfer(chamfer_19_edges, length=CHAMFER_19_SIZE)

    # Sketch 65 → Extrude 25 (add)
    with BuildSketch(Plane.XY.offset(70)):
        with Locations((7, -1.55)):
            Rectangle(SKETCH_65_W, SKETCH_65_H)
    extrude(amount=-EXTRUDE_25_DEPTH)

    # Sketch 66 → Extrude 26 (add)
    with BuildSketch(Plane(origin=(0, 0, -80), x_dir=(-1, 0, 0), z_dir=(0, 0, -1))):
        with Locations((-7, -1.55)):
            Rectangle(SKETCH_66_W, SKETCH_66_H)
    extrude(amount=-EXTRUDE_26_DEPTH)

    # Sketch 67 → Extrude 27 (add)
    with BuildSketch(Plane.XZ):
        with Locations((9.75, -5)):
            Rectangle(SKETCH_67_W, SKETCH_67_H)
    extrude(amount=EXTRUDE_27_DEPTH)


solid = part.part
